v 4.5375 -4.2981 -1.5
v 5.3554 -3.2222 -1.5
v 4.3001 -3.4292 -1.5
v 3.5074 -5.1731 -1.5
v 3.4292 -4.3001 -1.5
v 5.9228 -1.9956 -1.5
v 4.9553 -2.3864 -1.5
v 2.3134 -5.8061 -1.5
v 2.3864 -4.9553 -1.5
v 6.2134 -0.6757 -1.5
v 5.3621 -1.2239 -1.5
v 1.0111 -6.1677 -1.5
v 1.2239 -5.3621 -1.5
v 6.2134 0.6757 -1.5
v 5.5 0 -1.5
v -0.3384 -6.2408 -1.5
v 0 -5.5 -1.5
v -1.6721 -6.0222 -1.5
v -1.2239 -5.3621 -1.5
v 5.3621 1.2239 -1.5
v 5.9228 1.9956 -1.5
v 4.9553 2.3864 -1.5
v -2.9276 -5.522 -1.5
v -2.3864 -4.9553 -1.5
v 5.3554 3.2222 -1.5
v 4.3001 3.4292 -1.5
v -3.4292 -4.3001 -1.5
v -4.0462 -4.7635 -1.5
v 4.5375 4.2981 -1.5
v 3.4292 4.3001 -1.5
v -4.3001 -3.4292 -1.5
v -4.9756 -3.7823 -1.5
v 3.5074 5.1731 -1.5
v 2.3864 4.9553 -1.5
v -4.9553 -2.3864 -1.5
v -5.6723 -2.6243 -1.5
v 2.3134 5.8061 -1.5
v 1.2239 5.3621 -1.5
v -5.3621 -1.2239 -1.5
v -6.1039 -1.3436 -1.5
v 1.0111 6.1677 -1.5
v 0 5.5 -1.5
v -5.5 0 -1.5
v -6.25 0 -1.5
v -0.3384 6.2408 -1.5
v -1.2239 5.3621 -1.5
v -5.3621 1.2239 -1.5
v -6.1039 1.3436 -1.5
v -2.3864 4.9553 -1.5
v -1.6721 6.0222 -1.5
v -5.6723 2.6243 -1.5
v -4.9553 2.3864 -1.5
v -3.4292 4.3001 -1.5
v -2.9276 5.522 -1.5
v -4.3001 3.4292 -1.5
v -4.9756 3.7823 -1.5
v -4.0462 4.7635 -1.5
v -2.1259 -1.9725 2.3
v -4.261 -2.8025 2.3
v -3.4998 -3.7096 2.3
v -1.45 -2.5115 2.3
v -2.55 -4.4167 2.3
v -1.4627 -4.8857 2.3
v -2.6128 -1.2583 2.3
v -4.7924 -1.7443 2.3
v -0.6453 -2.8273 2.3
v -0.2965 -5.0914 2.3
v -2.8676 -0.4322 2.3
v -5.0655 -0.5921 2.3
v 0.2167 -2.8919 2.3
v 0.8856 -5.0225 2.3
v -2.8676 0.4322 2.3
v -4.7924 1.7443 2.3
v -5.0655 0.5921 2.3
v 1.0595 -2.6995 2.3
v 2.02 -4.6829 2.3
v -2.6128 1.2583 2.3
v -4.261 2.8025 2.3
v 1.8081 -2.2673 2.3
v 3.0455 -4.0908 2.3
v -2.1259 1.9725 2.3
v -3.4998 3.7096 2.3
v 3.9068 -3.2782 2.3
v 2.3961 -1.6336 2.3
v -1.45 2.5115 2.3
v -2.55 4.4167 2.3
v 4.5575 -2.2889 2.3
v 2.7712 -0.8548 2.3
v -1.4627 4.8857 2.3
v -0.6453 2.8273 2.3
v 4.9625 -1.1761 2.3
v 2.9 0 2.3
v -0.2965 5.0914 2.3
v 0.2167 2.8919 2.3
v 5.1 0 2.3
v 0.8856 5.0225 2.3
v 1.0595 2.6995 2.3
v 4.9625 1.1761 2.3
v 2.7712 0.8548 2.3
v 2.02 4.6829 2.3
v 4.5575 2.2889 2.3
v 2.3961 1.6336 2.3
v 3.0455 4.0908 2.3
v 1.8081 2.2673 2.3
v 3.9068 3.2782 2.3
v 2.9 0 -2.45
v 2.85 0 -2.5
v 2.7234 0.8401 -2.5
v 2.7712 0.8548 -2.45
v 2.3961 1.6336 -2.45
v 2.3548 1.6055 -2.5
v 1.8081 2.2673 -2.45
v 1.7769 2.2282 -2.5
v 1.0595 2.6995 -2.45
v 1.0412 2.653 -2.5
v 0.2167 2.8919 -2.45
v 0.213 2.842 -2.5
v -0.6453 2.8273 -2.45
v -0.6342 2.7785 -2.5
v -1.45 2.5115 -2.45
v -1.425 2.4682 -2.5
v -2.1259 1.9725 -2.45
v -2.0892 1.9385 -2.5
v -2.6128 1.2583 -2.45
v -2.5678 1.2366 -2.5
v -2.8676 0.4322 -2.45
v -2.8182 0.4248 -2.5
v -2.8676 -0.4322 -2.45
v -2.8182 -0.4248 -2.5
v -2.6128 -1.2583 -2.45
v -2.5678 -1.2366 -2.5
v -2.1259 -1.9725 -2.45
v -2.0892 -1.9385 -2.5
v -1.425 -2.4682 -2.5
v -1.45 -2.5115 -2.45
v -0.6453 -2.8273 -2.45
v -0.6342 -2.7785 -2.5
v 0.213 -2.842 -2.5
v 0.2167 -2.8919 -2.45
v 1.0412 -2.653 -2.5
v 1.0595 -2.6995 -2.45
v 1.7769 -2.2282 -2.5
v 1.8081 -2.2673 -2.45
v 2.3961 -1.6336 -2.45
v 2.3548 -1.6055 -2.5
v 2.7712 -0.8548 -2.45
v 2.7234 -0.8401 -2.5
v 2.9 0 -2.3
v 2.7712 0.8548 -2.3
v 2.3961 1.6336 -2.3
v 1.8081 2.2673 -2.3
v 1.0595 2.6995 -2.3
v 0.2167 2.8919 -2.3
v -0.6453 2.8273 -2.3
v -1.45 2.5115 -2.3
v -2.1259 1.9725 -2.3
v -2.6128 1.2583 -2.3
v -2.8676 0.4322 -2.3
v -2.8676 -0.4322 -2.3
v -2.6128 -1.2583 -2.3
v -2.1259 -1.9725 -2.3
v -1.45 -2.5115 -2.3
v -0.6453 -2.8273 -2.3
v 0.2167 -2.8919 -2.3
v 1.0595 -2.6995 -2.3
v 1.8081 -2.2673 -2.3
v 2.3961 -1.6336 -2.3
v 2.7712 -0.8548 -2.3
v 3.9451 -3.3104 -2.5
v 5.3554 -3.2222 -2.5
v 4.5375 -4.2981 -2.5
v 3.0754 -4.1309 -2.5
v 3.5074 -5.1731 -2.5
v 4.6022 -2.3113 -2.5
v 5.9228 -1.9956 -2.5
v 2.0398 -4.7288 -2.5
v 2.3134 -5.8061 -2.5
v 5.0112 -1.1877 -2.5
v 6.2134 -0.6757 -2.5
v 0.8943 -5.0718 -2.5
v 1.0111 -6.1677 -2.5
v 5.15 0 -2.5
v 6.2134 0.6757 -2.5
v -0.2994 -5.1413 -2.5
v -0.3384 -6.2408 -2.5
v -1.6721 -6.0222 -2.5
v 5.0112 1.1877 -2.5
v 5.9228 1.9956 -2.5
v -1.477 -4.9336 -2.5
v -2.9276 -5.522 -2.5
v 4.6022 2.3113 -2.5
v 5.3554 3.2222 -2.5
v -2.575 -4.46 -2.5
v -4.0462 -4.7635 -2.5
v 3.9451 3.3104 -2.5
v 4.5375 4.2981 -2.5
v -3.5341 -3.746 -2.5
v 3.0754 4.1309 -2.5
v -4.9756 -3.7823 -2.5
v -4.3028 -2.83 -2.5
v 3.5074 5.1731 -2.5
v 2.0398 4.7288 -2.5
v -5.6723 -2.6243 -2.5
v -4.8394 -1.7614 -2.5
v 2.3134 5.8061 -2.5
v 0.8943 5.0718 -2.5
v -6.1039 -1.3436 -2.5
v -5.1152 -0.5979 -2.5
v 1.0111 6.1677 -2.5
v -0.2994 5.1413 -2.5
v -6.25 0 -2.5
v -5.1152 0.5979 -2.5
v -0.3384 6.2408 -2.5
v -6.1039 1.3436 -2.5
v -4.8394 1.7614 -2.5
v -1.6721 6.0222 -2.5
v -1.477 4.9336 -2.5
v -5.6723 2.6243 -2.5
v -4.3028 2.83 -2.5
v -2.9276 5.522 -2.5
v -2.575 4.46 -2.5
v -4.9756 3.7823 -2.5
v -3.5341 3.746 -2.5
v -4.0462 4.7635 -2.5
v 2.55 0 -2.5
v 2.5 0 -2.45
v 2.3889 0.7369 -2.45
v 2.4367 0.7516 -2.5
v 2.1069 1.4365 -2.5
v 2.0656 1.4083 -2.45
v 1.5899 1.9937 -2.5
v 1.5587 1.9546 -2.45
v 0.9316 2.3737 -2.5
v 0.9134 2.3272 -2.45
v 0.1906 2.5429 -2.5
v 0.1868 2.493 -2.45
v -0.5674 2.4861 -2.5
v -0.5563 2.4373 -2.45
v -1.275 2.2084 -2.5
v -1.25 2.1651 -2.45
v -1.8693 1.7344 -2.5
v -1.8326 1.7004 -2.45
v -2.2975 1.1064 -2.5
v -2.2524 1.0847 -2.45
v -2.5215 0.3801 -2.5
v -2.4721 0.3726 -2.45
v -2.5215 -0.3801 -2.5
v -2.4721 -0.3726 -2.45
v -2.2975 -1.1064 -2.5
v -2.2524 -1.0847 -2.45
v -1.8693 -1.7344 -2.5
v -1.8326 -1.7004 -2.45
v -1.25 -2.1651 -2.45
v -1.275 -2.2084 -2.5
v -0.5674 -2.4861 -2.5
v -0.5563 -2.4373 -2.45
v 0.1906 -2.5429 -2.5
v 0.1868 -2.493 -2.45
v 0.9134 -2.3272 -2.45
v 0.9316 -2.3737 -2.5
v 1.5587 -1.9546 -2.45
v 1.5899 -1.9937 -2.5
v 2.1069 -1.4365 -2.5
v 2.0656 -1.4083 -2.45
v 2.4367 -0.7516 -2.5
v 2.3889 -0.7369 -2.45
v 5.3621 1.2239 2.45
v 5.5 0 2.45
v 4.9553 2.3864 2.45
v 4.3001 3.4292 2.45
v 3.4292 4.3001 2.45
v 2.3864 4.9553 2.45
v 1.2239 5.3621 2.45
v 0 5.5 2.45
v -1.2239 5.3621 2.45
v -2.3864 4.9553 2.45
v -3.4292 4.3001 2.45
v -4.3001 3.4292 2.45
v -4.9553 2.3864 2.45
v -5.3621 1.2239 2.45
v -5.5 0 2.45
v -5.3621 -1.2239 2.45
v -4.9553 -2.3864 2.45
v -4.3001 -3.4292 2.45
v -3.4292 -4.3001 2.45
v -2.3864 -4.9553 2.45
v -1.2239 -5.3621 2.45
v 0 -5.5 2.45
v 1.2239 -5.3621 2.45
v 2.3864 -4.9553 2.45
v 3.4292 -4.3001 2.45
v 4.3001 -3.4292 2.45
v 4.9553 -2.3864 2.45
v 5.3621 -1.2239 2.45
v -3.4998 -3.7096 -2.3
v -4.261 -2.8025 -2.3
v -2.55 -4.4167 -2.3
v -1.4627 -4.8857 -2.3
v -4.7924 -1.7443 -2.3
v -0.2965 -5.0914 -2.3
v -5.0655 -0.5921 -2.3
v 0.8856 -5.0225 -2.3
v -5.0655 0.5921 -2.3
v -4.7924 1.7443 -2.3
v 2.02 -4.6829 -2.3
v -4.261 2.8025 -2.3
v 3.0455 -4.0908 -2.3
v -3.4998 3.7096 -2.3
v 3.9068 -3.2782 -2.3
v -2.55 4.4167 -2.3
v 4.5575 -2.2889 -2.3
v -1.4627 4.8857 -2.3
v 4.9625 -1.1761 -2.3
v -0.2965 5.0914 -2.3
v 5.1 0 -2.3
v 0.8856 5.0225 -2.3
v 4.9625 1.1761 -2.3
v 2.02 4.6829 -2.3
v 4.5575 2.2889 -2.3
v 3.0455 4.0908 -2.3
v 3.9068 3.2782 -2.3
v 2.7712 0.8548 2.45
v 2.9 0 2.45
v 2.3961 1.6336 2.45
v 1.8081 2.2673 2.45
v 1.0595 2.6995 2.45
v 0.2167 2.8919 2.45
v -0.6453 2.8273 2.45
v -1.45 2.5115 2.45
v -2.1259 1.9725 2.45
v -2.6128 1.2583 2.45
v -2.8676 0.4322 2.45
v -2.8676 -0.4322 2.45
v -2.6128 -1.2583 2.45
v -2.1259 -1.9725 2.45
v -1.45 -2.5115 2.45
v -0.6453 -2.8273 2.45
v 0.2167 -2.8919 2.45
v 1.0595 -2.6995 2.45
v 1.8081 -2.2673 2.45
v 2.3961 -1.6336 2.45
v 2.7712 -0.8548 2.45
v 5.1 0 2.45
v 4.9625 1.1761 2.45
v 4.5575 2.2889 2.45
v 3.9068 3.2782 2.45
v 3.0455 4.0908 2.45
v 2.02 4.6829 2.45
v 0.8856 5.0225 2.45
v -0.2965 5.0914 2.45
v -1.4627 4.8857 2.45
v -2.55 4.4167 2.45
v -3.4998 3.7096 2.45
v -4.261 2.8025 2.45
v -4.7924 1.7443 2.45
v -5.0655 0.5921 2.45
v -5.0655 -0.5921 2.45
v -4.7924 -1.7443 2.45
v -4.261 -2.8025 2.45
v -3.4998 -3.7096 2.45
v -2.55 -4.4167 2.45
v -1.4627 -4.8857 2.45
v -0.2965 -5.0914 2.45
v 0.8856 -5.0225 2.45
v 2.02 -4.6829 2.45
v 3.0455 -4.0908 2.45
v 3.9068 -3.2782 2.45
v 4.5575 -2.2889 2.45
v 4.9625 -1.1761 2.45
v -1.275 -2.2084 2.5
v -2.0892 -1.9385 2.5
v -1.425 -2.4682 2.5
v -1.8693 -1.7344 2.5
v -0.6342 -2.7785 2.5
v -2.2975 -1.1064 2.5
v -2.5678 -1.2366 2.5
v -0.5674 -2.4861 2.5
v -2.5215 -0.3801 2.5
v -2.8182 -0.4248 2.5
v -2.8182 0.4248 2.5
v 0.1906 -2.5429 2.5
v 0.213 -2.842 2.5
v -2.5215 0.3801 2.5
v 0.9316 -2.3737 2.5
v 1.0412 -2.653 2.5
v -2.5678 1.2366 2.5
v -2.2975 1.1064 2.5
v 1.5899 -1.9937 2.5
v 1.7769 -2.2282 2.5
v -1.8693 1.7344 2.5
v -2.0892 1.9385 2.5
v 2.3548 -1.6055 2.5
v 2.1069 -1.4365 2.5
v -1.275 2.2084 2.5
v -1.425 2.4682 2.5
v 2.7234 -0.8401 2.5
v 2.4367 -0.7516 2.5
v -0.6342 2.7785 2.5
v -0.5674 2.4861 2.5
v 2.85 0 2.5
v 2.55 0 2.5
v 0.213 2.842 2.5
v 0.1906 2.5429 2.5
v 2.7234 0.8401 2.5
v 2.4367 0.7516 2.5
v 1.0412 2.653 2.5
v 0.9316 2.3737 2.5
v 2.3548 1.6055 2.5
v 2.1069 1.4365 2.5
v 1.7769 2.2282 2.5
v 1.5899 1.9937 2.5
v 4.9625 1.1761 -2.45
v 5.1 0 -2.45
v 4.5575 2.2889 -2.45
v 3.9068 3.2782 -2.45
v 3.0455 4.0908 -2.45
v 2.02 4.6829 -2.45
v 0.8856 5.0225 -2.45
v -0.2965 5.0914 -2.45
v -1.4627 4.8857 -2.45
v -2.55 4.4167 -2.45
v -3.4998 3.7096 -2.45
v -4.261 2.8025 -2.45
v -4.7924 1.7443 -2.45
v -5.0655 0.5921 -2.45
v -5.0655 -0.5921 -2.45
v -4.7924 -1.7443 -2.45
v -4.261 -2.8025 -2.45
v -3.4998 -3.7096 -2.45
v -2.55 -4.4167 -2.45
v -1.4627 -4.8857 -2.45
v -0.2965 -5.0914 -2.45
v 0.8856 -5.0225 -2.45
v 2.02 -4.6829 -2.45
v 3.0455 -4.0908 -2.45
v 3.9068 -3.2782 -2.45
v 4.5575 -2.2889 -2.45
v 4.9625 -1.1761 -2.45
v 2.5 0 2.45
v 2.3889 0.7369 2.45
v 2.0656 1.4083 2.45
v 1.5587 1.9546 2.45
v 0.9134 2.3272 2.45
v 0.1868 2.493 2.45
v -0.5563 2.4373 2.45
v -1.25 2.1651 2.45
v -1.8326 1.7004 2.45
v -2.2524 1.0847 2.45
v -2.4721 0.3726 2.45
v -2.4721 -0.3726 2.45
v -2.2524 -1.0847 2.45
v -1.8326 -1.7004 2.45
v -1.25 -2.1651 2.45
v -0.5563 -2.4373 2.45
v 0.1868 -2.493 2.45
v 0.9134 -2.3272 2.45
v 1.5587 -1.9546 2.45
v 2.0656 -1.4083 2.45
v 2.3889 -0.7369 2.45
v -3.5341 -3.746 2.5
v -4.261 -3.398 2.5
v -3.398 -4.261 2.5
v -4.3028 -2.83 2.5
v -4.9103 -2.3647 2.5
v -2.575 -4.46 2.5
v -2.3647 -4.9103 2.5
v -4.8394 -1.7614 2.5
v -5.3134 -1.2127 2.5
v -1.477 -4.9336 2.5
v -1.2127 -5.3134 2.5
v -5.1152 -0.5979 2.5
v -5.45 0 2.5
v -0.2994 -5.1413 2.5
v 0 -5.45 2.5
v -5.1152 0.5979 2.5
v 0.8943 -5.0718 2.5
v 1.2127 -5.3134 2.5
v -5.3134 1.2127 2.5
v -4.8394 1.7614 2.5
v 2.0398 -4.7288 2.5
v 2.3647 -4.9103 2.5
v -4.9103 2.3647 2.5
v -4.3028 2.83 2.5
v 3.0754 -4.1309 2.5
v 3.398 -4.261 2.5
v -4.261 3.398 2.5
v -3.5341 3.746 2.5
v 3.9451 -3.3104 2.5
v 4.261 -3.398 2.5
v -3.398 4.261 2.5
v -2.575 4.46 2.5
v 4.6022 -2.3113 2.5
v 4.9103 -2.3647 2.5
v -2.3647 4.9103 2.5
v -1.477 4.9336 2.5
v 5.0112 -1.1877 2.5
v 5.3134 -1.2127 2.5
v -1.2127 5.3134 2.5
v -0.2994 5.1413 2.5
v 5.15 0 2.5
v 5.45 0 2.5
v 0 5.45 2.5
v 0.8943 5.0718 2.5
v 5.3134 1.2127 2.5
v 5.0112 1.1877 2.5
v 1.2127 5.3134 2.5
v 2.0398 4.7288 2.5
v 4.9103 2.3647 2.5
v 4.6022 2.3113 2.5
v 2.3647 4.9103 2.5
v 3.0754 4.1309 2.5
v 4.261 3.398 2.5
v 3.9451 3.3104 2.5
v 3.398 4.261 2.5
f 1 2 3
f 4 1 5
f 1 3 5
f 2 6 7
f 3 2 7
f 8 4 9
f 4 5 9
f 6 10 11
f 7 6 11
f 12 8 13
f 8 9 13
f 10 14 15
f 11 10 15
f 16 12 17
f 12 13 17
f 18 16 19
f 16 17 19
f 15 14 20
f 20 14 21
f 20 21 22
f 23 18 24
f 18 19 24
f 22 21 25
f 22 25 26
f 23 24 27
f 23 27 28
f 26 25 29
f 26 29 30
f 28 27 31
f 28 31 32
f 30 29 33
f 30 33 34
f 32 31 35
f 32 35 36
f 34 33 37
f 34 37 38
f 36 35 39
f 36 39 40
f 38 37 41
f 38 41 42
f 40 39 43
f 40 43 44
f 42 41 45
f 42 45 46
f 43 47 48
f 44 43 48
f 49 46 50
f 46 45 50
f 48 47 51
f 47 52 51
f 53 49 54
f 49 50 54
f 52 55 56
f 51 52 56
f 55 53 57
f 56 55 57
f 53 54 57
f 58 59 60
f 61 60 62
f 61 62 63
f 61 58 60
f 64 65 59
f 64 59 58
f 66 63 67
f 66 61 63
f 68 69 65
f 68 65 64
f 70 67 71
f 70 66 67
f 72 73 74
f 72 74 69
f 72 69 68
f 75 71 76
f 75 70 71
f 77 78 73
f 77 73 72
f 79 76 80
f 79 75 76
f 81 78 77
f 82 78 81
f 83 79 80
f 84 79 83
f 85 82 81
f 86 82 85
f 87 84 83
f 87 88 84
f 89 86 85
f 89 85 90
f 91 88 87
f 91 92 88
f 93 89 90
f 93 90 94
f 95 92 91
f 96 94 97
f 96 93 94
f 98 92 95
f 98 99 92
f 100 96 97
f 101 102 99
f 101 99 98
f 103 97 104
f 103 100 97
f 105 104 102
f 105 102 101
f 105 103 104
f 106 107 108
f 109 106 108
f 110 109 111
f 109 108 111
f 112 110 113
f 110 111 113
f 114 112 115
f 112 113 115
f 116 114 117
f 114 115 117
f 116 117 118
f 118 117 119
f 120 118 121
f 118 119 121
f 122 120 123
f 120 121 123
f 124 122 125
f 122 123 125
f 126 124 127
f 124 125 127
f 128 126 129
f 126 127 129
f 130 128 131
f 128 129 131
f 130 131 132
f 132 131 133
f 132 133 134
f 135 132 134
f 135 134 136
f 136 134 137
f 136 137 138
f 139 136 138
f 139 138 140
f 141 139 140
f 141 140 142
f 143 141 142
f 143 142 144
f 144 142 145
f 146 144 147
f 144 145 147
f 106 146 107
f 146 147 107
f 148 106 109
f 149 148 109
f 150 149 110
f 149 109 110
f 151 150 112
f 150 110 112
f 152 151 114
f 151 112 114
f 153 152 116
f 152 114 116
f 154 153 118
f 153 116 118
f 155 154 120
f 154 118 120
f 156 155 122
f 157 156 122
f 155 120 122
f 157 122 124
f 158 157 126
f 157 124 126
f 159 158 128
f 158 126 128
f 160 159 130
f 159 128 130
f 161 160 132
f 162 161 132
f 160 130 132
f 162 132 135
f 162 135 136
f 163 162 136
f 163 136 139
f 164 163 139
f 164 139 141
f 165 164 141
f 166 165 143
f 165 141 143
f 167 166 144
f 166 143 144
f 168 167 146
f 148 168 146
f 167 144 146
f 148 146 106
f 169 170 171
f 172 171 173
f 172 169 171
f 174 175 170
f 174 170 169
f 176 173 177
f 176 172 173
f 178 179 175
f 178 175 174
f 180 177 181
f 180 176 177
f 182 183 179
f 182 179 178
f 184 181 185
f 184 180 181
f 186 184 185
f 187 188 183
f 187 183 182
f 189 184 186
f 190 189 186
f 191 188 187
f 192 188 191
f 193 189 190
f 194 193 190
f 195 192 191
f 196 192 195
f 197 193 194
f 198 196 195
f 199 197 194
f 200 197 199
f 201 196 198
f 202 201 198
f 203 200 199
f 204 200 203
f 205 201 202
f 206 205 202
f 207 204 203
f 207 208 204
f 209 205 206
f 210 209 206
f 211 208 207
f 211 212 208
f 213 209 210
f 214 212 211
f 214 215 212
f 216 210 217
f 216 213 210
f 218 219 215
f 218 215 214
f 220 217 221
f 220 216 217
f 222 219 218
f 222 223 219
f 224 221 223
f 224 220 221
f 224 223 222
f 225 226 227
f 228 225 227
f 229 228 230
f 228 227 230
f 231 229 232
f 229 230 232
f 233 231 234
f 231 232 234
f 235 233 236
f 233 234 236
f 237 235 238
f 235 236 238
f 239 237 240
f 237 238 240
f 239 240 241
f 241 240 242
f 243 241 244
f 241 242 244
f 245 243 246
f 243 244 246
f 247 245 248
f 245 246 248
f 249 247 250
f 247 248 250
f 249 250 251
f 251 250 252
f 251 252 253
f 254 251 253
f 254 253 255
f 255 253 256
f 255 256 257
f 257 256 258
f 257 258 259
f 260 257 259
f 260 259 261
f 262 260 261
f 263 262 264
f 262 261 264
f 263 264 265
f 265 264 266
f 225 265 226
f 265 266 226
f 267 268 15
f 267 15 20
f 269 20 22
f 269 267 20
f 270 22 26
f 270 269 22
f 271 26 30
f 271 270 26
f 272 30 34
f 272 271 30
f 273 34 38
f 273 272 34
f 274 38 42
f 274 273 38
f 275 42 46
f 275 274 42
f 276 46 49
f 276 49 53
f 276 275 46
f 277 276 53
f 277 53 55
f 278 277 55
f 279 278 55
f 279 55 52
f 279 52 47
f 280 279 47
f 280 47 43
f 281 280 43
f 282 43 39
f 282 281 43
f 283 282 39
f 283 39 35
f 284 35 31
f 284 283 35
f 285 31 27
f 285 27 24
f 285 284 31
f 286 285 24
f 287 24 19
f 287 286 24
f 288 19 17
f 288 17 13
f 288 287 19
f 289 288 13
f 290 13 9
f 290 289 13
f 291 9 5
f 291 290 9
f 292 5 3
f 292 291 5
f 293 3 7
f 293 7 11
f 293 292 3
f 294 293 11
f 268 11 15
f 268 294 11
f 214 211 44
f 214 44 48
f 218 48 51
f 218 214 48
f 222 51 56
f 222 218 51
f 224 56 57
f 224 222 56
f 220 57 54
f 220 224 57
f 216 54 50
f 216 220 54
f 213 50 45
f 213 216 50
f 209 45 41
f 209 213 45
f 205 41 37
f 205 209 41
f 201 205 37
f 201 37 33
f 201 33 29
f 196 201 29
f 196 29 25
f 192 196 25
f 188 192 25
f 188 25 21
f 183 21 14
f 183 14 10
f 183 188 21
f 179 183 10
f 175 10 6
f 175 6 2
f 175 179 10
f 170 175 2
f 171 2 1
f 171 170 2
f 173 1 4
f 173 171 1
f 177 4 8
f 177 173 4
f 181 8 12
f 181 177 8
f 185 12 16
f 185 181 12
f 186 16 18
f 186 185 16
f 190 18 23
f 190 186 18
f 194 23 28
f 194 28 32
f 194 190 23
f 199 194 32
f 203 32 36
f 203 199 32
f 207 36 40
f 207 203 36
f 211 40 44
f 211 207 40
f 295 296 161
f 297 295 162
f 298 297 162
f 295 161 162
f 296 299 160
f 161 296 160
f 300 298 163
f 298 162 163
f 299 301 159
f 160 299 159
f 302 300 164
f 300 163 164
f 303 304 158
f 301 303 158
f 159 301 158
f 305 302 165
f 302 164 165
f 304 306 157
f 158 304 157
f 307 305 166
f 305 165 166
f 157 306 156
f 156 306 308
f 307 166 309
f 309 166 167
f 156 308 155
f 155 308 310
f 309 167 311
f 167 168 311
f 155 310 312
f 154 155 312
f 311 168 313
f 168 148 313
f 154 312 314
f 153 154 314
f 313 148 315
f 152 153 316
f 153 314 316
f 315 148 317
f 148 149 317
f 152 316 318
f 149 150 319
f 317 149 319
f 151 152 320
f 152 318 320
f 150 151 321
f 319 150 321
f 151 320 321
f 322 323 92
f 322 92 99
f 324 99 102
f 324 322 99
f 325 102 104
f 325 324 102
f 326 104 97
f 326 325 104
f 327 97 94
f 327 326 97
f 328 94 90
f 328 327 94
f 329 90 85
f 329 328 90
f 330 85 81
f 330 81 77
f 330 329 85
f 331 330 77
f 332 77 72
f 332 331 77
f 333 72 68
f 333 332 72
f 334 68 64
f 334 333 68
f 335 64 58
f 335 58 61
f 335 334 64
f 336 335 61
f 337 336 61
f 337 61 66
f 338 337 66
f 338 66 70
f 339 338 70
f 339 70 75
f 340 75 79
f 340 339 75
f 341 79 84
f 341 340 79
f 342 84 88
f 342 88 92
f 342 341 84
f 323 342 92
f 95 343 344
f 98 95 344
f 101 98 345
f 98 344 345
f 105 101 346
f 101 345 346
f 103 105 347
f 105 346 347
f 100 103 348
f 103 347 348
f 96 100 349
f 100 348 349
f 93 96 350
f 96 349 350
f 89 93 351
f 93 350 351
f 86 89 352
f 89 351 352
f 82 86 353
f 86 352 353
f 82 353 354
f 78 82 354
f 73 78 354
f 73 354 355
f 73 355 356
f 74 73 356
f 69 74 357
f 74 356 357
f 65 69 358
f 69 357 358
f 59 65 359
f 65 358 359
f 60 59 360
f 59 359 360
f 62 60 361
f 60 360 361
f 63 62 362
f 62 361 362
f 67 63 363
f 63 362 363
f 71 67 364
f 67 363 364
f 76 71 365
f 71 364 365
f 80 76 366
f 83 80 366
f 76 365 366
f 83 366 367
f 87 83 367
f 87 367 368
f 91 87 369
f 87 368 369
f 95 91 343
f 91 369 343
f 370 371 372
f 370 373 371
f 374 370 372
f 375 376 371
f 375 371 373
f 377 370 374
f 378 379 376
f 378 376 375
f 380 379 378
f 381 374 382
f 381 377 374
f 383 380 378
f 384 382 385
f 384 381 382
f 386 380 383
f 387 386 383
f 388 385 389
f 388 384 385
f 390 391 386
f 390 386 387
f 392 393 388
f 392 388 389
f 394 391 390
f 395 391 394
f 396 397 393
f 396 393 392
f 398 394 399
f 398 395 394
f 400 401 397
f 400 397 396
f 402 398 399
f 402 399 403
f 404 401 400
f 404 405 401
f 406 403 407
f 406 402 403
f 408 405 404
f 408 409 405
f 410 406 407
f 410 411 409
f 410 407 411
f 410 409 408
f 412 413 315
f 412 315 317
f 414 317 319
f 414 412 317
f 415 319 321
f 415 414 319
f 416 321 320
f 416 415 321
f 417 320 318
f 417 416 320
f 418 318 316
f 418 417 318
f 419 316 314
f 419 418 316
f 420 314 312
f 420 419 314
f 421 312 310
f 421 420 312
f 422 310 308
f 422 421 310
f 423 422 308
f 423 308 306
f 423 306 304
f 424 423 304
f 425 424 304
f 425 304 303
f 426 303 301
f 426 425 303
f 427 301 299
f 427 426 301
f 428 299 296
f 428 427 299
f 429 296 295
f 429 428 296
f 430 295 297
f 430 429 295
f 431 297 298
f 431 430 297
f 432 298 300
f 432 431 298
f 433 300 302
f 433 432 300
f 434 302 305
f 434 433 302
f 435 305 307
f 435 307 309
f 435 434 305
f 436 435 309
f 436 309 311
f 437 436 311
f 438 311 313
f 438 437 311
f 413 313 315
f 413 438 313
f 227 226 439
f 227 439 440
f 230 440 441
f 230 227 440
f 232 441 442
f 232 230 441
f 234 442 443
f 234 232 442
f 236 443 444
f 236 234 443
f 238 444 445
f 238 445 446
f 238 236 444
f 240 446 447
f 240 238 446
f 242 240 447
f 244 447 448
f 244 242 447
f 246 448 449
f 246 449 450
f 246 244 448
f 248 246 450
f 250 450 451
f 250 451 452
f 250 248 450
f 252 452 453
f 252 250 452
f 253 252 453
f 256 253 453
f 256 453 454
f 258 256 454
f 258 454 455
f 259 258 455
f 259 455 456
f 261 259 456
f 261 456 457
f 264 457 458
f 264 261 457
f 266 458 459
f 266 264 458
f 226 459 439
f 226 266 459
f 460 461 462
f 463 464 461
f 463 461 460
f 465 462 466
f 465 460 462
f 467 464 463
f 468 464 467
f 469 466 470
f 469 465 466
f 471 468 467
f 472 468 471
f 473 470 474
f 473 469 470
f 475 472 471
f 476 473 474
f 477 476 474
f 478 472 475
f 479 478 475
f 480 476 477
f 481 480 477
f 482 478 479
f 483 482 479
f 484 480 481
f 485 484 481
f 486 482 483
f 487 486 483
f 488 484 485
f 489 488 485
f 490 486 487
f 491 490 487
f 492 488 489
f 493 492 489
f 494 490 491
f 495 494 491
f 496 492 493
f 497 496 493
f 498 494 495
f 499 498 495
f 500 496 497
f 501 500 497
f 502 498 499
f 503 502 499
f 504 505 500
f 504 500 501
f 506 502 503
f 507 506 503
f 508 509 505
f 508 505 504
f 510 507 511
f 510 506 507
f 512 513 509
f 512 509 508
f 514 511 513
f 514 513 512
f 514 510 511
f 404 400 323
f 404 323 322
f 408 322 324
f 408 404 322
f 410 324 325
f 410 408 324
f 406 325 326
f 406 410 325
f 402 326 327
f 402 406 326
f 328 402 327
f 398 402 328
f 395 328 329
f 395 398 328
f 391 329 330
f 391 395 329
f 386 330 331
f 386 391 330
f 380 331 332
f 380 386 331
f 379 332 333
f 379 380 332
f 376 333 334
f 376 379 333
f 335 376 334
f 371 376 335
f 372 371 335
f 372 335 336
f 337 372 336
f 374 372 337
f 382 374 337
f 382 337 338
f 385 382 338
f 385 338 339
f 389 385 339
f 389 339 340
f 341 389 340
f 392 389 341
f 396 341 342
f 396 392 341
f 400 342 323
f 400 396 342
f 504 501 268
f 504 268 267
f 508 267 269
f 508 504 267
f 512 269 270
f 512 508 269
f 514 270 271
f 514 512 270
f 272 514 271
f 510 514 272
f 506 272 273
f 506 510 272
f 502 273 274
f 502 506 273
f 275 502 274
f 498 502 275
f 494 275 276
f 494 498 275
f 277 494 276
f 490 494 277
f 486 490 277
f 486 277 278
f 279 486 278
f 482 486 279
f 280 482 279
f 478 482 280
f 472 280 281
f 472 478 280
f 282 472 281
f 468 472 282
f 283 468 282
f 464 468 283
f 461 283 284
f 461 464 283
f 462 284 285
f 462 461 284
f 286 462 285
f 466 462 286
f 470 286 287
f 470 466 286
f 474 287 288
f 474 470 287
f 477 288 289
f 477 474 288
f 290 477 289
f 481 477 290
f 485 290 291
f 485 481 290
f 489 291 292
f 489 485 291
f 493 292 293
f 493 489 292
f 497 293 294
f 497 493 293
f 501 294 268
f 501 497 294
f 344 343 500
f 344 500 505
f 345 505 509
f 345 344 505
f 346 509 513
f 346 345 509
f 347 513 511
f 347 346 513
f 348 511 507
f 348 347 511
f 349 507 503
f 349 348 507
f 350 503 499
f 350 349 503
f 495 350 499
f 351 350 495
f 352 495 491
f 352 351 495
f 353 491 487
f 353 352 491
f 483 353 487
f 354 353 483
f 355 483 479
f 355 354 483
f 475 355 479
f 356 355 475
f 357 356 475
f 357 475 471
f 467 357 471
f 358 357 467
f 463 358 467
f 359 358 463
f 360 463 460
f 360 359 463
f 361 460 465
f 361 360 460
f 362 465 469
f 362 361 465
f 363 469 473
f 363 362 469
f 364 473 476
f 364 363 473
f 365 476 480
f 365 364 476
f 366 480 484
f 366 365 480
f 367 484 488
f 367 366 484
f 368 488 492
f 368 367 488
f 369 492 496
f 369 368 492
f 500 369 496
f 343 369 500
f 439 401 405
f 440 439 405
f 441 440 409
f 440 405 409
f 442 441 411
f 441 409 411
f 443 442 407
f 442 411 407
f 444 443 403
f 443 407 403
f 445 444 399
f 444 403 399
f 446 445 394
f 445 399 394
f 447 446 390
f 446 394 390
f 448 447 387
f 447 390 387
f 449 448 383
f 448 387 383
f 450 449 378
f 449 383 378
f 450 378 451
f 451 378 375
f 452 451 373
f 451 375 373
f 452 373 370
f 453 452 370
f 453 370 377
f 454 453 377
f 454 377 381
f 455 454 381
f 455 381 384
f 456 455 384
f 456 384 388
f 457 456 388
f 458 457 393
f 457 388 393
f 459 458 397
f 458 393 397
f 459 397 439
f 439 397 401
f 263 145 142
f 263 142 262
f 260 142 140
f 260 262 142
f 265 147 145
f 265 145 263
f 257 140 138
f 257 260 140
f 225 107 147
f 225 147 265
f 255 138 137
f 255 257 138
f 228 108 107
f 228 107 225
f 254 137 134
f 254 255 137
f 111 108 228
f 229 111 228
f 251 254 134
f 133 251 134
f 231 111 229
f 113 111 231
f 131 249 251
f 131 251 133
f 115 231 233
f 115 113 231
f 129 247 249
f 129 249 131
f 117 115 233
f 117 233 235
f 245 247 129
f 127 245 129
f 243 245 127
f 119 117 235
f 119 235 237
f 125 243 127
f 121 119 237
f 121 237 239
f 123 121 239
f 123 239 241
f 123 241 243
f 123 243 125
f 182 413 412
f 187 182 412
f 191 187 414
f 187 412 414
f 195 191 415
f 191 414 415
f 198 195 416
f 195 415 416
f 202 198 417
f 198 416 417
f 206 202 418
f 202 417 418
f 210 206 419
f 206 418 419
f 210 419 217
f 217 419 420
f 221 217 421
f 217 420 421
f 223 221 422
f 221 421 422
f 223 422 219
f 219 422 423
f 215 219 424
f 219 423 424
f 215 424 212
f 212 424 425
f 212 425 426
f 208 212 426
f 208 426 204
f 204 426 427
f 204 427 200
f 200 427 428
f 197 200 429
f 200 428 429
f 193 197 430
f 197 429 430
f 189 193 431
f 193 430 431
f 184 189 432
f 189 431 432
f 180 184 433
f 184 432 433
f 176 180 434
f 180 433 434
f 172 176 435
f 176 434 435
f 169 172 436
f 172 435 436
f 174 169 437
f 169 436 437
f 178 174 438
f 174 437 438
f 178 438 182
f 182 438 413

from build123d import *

# Parameters (mm, degrees)
SKETCH_1_R          = 5.5
SKETCH_1_R_2        = 2.5
EXTRUDE_1_DEPTH     = 2.5
SKETCH_3_R          = 6.25
SKETCH_3_R_2        = 2.5
EXTRUDE_2_DEPTH     = 1
SKETCH_4_R          = 5.1
SKETCH_4_R_2        = 2.9
CUT_EXTRUDE_1_DEPTH = 0.2
CHAMFER_1_SIZE      = 0.05


with BuildPart() as part:
    # 草图1 → 凸台-拉伸1 (new body, symmetric)
    with BuildSketch(Plane.XY):
        Circle(SKETCH_1_R)
        Circle(SKETCH_1_R_2, mode=Mode.SUBTRACT)
    extrude(amount=EXTRUDE_1_DEPTH, both=True)

    # 草图3 → 凸台-拉伸2 (add)
    with BuildSketch(Plane(origin=(0, 0, -2.5), x_dir=(-1, 0, 0), z_dir=(0, 0, -1))):
        Circle(SKETCH_3_R)
        Circle(SKETCH_3_R_2, mode=Mode.SUBTRACT)
    extrude(amount=-EXTRUDE_2_DEPTH)

    # 草图4 → 切除-拉伸1 (cut)
    with BuildSketch(Plane.XY.offset(2.5)):
        Circle(SKETCH_4_R)
        Circle(SKETCH_4_R_2, mode=Mode.SUBTRACT)
    cut_extrude_1 = extrude(amount=-CUT_EXTRUDE_1_DEPTH, mode=Mode.SUBTRACT)

    # 镜向1: 切除-拉伸1 across plane
    add(cut_extrude_1.mirror(Plane.XY), mode=Mode.SUBTRACT)

    # 倒角1
    chamfer_1_edges = [part.edges().sort_by_distance(p)[0] for p in [
        (-5.1, 0, 2.5),
        (-2.9, 0, 2.5),
        (-2.9, 0, -2.5),
        (-5.1, 0, -2.5),
        (-5.5, 0, 2.5),
        (-2.5, 0, -2.5),
        (-2.5, 0, 2.5),
    ]]
    chamfer(chamfer_1_edges, length=CHAMFER_1_SIZE)


solid = part.part
